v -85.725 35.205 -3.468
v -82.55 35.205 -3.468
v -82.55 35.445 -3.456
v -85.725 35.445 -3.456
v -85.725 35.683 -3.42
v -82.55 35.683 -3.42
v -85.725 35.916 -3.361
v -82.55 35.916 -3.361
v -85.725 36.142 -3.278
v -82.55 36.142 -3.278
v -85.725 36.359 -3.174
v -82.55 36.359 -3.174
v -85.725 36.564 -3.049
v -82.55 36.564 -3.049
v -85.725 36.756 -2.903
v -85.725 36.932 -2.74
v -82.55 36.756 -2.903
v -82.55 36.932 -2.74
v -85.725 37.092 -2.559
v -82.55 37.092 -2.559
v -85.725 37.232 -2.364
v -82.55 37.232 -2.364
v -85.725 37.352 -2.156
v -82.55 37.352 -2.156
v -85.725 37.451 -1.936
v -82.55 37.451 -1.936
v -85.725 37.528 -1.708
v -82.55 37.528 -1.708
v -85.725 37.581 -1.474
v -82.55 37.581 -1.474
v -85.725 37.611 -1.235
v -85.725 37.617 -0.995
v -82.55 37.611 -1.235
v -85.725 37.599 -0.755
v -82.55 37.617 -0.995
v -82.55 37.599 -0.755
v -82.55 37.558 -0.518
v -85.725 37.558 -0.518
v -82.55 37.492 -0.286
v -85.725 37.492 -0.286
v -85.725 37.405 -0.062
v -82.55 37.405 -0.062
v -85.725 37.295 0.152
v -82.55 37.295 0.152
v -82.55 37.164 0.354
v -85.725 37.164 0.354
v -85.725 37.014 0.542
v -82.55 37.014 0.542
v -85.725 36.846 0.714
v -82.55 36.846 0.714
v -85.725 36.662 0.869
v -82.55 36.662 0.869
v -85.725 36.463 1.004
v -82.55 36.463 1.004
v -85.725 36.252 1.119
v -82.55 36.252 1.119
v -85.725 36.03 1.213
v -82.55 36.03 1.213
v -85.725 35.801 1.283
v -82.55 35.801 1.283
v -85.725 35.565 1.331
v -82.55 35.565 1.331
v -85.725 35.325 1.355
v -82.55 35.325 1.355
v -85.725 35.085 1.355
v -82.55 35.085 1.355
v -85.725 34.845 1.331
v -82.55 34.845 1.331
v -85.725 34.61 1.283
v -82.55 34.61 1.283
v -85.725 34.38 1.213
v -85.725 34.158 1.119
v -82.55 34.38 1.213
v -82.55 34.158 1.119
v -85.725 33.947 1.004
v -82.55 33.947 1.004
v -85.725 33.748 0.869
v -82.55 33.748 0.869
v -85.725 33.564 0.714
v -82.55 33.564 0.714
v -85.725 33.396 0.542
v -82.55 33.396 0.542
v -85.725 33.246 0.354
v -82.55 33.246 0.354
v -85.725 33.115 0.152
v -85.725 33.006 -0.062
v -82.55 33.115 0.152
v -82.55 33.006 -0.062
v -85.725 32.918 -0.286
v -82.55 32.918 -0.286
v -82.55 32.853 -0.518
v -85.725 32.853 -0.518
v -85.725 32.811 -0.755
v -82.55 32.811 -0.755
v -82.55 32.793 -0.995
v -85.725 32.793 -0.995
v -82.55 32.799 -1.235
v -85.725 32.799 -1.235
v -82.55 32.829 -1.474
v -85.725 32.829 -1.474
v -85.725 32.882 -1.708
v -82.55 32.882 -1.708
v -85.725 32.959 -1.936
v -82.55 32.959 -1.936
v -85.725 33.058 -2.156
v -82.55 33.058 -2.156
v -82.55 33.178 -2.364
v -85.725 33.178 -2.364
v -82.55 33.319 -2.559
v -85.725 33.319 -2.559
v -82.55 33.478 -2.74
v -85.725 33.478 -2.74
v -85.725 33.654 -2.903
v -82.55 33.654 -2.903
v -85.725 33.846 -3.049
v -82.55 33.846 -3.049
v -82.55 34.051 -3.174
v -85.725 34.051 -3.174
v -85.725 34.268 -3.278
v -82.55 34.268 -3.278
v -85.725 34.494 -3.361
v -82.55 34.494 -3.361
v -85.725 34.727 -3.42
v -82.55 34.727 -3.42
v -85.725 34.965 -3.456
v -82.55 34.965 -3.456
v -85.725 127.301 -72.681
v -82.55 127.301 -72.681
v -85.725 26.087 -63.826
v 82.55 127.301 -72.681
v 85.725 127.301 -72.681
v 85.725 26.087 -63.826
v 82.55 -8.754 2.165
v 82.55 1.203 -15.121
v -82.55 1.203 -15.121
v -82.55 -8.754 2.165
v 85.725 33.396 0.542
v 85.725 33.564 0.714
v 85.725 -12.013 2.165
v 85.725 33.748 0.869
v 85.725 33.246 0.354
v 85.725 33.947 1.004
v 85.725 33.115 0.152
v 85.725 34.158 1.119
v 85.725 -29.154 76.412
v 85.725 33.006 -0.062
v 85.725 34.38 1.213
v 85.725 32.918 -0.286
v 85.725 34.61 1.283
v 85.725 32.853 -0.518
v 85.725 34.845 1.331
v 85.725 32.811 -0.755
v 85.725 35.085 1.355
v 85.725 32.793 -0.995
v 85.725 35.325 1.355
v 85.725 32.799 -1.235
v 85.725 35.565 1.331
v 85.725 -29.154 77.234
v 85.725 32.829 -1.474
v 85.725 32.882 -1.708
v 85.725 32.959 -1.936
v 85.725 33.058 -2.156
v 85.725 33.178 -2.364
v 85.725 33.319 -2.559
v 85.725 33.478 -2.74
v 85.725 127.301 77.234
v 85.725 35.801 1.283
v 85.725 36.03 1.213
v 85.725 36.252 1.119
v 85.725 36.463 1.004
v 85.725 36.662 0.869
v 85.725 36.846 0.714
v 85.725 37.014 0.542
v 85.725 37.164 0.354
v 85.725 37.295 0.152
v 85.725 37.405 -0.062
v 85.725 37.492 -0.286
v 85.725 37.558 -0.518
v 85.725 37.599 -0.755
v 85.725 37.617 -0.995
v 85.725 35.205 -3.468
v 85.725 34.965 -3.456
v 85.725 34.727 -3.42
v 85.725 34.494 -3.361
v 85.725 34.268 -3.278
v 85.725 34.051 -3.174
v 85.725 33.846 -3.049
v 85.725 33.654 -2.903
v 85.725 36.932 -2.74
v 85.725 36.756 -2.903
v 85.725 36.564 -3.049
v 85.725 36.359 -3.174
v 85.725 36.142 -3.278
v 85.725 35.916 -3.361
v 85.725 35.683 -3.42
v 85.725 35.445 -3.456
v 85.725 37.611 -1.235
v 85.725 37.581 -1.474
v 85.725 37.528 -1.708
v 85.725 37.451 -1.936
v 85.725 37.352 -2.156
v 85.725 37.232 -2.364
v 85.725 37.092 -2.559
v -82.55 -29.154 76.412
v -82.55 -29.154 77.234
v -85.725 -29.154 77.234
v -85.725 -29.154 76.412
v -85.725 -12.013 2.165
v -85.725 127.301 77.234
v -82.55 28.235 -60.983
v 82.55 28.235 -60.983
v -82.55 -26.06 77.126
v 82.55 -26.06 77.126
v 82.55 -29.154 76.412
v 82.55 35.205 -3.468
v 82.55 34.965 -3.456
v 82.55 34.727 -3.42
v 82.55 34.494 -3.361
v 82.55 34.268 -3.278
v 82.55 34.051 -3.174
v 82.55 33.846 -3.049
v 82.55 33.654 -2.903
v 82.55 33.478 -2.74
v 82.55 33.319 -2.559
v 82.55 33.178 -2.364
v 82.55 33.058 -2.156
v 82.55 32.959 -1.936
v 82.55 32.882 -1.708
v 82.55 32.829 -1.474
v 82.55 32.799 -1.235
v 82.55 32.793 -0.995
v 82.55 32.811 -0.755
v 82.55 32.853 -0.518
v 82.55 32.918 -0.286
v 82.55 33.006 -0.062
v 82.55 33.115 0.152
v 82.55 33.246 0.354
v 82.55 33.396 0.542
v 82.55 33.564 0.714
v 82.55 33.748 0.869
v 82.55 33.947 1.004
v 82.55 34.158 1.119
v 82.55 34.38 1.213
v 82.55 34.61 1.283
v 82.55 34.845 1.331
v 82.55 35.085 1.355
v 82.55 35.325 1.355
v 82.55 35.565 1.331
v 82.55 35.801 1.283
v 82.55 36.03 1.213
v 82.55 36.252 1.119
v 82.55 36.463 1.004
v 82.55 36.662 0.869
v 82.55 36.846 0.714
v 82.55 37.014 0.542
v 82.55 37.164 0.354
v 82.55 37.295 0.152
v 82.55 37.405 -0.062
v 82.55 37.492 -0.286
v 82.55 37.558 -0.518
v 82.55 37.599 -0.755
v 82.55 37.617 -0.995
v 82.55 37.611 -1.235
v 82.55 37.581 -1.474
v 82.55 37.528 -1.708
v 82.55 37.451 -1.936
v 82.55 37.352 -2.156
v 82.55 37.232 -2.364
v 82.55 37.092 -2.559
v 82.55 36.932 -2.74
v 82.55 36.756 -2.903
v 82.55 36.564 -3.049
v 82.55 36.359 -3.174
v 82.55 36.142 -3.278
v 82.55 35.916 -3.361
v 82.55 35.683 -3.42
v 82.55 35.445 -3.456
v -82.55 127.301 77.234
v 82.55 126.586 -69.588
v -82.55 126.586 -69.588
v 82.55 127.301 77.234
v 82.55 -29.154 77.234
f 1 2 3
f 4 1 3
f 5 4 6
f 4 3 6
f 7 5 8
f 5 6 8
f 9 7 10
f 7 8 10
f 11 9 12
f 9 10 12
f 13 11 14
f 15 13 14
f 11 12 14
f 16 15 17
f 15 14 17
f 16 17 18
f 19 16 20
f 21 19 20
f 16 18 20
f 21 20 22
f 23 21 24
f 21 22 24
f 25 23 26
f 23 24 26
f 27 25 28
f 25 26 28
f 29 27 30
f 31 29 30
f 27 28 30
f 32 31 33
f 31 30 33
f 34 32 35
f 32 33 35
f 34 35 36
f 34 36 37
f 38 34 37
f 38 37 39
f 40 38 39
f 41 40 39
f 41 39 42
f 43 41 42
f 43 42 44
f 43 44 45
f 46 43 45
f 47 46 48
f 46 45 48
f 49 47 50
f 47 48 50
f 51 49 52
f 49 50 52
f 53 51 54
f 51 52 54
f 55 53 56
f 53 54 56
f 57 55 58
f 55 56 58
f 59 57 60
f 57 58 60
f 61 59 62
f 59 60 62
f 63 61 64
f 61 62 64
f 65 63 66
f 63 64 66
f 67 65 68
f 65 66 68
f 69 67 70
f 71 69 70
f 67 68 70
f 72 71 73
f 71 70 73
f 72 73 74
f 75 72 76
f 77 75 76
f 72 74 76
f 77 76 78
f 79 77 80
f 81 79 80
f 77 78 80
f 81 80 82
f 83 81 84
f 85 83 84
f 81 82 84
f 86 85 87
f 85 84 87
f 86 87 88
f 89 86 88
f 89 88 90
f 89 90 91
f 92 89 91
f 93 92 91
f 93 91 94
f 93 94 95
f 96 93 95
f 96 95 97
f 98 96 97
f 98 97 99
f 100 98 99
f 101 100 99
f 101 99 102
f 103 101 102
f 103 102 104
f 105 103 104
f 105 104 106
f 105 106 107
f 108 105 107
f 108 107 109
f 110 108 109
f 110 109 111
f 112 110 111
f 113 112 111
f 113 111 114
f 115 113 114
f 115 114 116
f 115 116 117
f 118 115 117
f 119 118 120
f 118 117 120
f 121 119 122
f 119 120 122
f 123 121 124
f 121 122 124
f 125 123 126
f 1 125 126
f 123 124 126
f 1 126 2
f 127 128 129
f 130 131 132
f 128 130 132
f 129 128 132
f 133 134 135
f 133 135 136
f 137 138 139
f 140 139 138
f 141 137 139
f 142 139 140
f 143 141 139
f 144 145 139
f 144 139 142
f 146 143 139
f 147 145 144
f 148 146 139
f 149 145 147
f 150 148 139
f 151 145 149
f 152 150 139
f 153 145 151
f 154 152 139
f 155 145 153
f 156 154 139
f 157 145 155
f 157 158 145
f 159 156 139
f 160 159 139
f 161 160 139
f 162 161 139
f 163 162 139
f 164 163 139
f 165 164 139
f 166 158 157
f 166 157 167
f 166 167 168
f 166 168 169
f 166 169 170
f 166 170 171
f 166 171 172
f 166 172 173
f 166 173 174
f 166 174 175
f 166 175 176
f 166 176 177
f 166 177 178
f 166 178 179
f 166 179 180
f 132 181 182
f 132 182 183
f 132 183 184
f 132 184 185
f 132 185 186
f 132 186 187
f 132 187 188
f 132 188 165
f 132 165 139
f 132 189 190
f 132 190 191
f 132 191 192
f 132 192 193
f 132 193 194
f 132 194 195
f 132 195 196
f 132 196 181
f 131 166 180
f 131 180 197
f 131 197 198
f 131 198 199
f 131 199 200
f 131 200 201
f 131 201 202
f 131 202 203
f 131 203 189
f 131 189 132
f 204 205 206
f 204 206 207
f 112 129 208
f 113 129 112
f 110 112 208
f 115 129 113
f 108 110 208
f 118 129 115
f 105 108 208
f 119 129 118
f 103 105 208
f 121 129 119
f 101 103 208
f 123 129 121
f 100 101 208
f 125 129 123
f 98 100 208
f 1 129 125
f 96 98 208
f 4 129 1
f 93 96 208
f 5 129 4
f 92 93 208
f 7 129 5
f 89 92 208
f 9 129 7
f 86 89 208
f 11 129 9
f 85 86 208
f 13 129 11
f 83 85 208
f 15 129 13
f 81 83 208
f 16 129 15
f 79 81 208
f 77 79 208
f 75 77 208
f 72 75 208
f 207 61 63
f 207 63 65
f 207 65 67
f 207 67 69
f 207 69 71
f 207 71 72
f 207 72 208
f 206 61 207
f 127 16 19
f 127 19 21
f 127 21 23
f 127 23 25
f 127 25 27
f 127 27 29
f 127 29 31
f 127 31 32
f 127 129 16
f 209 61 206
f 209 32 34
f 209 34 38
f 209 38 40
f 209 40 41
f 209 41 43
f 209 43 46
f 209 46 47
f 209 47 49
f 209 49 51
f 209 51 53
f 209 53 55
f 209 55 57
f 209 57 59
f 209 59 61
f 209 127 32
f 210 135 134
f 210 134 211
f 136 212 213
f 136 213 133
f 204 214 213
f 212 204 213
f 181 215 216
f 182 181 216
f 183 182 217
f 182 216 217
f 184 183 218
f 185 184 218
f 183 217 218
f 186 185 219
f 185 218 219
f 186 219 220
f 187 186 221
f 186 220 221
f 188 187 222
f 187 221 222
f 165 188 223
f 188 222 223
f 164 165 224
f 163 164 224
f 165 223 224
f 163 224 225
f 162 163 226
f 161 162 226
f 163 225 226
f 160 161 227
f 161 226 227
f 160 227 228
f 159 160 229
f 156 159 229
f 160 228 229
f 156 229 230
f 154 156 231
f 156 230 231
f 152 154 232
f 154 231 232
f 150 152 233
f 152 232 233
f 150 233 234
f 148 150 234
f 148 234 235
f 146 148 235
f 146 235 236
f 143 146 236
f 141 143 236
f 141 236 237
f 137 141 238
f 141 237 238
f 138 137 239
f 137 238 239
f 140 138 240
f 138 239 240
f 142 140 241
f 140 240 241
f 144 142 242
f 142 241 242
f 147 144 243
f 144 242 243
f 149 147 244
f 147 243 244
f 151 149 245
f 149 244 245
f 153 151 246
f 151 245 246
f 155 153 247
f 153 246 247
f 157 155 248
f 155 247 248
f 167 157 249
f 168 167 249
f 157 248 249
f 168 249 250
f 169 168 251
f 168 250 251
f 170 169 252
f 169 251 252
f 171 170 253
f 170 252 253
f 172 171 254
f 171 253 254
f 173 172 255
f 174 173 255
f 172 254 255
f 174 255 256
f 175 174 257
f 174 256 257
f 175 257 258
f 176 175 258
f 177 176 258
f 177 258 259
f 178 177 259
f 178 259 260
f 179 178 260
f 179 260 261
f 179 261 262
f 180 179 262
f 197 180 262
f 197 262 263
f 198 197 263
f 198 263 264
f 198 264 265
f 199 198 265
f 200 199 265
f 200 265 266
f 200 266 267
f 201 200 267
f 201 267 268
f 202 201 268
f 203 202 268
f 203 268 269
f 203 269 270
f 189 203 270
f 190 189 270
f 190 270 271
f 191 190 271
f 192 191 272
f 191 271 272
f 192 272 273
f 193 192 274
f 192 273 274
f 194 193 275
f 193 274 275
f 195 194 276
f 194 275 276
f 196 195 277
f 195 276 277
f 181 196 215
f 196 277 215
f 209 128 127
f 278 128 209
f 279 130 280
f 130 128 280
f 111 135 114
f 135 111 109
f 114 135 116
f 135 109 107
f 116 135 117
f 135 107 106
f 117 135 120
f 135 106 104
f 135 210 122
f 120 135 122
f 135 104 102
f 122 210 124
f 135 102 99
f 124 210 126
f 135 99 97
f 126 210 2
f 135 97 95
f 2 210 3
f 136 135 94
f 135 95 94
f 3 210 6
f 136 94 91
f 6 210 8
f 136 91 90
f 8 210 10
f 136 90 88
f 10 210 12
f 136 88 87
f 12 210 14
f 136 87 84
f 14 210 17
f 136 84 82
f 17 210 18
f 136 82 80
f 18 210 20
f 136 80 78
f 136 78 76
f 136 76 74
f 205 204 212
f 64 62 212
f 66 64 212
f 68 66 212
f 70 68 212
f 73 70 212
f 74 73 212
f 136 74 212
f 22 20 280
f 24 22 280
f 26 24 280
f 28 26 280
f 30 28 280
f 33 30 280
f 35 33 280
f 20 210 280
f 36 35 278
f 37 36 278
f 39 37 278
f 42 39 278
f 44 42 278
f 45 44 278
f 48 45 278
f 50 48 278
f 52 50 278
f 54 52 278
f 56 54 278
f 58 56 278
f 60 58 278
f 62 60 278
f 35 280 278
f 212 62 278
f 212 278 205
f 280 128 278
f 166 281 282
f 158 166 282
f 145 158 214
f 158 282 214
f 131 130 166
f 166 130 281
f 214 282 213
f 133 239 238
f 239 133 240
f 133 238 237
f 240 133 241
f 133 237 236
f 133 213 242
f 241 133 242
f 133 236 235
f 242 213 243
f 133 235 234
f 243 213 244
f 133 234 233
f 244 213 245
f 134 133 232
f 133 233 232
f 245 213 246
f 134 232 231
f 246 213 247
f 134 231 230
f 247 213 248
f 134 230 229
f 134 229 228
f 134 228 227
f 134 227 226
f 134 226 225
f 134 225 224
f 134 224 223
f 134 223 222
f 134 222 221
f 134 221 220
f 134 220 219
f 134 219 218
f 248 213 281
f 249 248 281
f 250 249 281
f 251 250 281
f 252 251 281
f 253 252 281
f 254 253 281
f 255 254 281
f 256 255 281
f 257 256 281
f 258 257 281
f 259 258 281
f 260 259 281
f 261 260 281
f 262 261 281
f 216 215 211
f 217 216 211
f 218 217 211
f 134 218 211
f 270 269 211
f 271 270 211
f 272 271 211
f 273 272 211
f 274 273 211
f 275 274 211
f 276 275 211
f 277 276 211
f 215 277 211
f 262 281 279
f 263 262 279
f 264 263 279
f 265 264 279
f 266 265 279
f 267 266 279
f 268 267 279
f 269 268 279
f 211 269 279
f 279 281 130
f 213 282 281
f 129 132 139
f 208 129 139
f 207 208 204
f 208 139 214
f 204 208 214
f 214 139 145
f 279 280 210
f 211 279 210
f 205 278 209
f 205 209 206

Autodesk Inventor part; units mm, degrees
ref_plane "YZ Plane" through (0, 0, 0) normal (1, 0, 0) x (0, 1, 0)
ref_plane "XZ Plane" through (0, 0, 0) normal (0, 1, 0) x (-1, 0, 0)
ref_plane "XY Plane" through (0, 0, 0) normal (0, 0, 1) x (1, 0, 0)
sketch "Sketch1" plane through (0, 0, 0) normal (1, 0, 0) x (0, 1, 0)
  line L0 (-63.8691, 100.7559) -> (-60.6941, 100.7559)
  line L1 (-12.0126, 2.1649) -> (-29.1539, 76.4119)
  line L2 (-12.0126, 2.1649) -> (64.1874, 2.1649) construction
  line L3 (-12.0126, 2.1649) -> (26.0874, -63.8262)
  line L4 (-12.0126, 2.1649) -> (64.1874, 2.1649) construction
  line L5 (26.0874, -63.8262) -> (127.3008, -72.6812)
  line L6 (-29.1539, 76.4119) -> (-26.0603, 77.1261)
  line L7 (-26.0603, 77.1261) -> (-8.7541, 2.1649)
  line L8 (127.3008, -72.6812) -> (126.5865, -69.5876)
  line L9 (126.5865, -69.5876) -> (28.235, -60.983)
  line L10 (1.2031, -15.1211) -> (28.235, -60.983)
  line L11 (1.2031, -15.1211) -> (-8.7541, 2.1649)
  dimension "d4" = 3.175
  dimension "d6" = 76.2
  dimension "d7" = 103
  dimension "d8" = 76.2
  dimension "d9" = 60
  dimension "d10" = 101.6
  dimension "d11" = 125
  dimension "d12" = 3.175
  dimension "d13" = 3.175
extrude "Extrusion1" add sketch "Sketch1" along normal mid plane 165.1
sketch "Sketch2" plane through (82.55, 0, 0) normal (1, 0, 0) x (0, 0, -1)
  line L0 (63.8262, 26.0874) -> (72.6812, 127.3008) projected
  line L1 (69.5876, 126.5865) -> (60.983, 28.235) projected
  line L2 (72.6812, 127.3008) -> (-77.2337, 127.3008)
  line L3 (-77.2337, 127.3008) -> (-77.2337, -29.1539)
  line L4 (-77.2337, -29.1539) -> (-76.4119, -29.1539)
  line L5 (72.6812, 127.3008) -> (63.8262, 26.0874)
  line L6 (-76.4119, -29.1539) -> (-2.1649, -12.0126) projected
  line L7 (-2.1649, -12.0126) -> (63.8262, 26.0874) projected
  line L8 (-76.4119, -29.1539) -> (-2.1649, -12.0126)
  line L9 (-2.1649, -12.0126) -> (63.8262, 26.0874)
  point P0 (0, 0)
extrude "Extrusion2" add sketch "Sketch2" along normal blind 3.175
sketch "Sketch3" plane through (-82.55, 0, 0) normal (-1, 0, 0) x (0, 0, 1)
  line L0 (-69.5876, 126.5865) -> (-72.6812, 127.3008) projected
  line L1 (-72.6812, 127.3008) -> (-63.8262, 26.0874) projected
  line L2 (-63.8262, 26.0874) -> (2.1649, -12.0126) projected
  line L3 (77.2337, -29.1539) -> (-72.6812, -29.1539)
  line L4 (-72.6812, -29.1539) -> (-72.6812, 127.3008)
  line L5 (-72.6812, 127.3008) -> (77.2337, 127.3008)
  line L6 (77.2337, 127.3008) -> (77.2337, -29.1539)
  line L7 (-72.6812, 127.3008) -> (-63.8262, 26.0874)
  line L8 (-63.8262, 26.0874) -> (2.1649, -12.0126)
  line L9 (2.1649, -12.0126) -> (76.4119, -29.1539)
  line L10 (76.4119, -29.1539) -> (77.2337, -29.1539)
  point P0 (0, 0)
extrude "Extrusion3" add sketch "Sketch3" along normal blind 3.175 contours L5 L6 L3 L9 L2 L1
sketch "Sketch4" plane through (-82.55, 0, 0) normal (1, 0, 0) x (0, 0, -1)
  circle A0 centre (1.0549, 35.2051) radius 2.413
  point P0 (0, 0)
  dimension "d21" = 4.826
extrude "Extrusion4" cut sketch "Sketch4" along normal through all both and the other way through all
properties part number "Bucket"
